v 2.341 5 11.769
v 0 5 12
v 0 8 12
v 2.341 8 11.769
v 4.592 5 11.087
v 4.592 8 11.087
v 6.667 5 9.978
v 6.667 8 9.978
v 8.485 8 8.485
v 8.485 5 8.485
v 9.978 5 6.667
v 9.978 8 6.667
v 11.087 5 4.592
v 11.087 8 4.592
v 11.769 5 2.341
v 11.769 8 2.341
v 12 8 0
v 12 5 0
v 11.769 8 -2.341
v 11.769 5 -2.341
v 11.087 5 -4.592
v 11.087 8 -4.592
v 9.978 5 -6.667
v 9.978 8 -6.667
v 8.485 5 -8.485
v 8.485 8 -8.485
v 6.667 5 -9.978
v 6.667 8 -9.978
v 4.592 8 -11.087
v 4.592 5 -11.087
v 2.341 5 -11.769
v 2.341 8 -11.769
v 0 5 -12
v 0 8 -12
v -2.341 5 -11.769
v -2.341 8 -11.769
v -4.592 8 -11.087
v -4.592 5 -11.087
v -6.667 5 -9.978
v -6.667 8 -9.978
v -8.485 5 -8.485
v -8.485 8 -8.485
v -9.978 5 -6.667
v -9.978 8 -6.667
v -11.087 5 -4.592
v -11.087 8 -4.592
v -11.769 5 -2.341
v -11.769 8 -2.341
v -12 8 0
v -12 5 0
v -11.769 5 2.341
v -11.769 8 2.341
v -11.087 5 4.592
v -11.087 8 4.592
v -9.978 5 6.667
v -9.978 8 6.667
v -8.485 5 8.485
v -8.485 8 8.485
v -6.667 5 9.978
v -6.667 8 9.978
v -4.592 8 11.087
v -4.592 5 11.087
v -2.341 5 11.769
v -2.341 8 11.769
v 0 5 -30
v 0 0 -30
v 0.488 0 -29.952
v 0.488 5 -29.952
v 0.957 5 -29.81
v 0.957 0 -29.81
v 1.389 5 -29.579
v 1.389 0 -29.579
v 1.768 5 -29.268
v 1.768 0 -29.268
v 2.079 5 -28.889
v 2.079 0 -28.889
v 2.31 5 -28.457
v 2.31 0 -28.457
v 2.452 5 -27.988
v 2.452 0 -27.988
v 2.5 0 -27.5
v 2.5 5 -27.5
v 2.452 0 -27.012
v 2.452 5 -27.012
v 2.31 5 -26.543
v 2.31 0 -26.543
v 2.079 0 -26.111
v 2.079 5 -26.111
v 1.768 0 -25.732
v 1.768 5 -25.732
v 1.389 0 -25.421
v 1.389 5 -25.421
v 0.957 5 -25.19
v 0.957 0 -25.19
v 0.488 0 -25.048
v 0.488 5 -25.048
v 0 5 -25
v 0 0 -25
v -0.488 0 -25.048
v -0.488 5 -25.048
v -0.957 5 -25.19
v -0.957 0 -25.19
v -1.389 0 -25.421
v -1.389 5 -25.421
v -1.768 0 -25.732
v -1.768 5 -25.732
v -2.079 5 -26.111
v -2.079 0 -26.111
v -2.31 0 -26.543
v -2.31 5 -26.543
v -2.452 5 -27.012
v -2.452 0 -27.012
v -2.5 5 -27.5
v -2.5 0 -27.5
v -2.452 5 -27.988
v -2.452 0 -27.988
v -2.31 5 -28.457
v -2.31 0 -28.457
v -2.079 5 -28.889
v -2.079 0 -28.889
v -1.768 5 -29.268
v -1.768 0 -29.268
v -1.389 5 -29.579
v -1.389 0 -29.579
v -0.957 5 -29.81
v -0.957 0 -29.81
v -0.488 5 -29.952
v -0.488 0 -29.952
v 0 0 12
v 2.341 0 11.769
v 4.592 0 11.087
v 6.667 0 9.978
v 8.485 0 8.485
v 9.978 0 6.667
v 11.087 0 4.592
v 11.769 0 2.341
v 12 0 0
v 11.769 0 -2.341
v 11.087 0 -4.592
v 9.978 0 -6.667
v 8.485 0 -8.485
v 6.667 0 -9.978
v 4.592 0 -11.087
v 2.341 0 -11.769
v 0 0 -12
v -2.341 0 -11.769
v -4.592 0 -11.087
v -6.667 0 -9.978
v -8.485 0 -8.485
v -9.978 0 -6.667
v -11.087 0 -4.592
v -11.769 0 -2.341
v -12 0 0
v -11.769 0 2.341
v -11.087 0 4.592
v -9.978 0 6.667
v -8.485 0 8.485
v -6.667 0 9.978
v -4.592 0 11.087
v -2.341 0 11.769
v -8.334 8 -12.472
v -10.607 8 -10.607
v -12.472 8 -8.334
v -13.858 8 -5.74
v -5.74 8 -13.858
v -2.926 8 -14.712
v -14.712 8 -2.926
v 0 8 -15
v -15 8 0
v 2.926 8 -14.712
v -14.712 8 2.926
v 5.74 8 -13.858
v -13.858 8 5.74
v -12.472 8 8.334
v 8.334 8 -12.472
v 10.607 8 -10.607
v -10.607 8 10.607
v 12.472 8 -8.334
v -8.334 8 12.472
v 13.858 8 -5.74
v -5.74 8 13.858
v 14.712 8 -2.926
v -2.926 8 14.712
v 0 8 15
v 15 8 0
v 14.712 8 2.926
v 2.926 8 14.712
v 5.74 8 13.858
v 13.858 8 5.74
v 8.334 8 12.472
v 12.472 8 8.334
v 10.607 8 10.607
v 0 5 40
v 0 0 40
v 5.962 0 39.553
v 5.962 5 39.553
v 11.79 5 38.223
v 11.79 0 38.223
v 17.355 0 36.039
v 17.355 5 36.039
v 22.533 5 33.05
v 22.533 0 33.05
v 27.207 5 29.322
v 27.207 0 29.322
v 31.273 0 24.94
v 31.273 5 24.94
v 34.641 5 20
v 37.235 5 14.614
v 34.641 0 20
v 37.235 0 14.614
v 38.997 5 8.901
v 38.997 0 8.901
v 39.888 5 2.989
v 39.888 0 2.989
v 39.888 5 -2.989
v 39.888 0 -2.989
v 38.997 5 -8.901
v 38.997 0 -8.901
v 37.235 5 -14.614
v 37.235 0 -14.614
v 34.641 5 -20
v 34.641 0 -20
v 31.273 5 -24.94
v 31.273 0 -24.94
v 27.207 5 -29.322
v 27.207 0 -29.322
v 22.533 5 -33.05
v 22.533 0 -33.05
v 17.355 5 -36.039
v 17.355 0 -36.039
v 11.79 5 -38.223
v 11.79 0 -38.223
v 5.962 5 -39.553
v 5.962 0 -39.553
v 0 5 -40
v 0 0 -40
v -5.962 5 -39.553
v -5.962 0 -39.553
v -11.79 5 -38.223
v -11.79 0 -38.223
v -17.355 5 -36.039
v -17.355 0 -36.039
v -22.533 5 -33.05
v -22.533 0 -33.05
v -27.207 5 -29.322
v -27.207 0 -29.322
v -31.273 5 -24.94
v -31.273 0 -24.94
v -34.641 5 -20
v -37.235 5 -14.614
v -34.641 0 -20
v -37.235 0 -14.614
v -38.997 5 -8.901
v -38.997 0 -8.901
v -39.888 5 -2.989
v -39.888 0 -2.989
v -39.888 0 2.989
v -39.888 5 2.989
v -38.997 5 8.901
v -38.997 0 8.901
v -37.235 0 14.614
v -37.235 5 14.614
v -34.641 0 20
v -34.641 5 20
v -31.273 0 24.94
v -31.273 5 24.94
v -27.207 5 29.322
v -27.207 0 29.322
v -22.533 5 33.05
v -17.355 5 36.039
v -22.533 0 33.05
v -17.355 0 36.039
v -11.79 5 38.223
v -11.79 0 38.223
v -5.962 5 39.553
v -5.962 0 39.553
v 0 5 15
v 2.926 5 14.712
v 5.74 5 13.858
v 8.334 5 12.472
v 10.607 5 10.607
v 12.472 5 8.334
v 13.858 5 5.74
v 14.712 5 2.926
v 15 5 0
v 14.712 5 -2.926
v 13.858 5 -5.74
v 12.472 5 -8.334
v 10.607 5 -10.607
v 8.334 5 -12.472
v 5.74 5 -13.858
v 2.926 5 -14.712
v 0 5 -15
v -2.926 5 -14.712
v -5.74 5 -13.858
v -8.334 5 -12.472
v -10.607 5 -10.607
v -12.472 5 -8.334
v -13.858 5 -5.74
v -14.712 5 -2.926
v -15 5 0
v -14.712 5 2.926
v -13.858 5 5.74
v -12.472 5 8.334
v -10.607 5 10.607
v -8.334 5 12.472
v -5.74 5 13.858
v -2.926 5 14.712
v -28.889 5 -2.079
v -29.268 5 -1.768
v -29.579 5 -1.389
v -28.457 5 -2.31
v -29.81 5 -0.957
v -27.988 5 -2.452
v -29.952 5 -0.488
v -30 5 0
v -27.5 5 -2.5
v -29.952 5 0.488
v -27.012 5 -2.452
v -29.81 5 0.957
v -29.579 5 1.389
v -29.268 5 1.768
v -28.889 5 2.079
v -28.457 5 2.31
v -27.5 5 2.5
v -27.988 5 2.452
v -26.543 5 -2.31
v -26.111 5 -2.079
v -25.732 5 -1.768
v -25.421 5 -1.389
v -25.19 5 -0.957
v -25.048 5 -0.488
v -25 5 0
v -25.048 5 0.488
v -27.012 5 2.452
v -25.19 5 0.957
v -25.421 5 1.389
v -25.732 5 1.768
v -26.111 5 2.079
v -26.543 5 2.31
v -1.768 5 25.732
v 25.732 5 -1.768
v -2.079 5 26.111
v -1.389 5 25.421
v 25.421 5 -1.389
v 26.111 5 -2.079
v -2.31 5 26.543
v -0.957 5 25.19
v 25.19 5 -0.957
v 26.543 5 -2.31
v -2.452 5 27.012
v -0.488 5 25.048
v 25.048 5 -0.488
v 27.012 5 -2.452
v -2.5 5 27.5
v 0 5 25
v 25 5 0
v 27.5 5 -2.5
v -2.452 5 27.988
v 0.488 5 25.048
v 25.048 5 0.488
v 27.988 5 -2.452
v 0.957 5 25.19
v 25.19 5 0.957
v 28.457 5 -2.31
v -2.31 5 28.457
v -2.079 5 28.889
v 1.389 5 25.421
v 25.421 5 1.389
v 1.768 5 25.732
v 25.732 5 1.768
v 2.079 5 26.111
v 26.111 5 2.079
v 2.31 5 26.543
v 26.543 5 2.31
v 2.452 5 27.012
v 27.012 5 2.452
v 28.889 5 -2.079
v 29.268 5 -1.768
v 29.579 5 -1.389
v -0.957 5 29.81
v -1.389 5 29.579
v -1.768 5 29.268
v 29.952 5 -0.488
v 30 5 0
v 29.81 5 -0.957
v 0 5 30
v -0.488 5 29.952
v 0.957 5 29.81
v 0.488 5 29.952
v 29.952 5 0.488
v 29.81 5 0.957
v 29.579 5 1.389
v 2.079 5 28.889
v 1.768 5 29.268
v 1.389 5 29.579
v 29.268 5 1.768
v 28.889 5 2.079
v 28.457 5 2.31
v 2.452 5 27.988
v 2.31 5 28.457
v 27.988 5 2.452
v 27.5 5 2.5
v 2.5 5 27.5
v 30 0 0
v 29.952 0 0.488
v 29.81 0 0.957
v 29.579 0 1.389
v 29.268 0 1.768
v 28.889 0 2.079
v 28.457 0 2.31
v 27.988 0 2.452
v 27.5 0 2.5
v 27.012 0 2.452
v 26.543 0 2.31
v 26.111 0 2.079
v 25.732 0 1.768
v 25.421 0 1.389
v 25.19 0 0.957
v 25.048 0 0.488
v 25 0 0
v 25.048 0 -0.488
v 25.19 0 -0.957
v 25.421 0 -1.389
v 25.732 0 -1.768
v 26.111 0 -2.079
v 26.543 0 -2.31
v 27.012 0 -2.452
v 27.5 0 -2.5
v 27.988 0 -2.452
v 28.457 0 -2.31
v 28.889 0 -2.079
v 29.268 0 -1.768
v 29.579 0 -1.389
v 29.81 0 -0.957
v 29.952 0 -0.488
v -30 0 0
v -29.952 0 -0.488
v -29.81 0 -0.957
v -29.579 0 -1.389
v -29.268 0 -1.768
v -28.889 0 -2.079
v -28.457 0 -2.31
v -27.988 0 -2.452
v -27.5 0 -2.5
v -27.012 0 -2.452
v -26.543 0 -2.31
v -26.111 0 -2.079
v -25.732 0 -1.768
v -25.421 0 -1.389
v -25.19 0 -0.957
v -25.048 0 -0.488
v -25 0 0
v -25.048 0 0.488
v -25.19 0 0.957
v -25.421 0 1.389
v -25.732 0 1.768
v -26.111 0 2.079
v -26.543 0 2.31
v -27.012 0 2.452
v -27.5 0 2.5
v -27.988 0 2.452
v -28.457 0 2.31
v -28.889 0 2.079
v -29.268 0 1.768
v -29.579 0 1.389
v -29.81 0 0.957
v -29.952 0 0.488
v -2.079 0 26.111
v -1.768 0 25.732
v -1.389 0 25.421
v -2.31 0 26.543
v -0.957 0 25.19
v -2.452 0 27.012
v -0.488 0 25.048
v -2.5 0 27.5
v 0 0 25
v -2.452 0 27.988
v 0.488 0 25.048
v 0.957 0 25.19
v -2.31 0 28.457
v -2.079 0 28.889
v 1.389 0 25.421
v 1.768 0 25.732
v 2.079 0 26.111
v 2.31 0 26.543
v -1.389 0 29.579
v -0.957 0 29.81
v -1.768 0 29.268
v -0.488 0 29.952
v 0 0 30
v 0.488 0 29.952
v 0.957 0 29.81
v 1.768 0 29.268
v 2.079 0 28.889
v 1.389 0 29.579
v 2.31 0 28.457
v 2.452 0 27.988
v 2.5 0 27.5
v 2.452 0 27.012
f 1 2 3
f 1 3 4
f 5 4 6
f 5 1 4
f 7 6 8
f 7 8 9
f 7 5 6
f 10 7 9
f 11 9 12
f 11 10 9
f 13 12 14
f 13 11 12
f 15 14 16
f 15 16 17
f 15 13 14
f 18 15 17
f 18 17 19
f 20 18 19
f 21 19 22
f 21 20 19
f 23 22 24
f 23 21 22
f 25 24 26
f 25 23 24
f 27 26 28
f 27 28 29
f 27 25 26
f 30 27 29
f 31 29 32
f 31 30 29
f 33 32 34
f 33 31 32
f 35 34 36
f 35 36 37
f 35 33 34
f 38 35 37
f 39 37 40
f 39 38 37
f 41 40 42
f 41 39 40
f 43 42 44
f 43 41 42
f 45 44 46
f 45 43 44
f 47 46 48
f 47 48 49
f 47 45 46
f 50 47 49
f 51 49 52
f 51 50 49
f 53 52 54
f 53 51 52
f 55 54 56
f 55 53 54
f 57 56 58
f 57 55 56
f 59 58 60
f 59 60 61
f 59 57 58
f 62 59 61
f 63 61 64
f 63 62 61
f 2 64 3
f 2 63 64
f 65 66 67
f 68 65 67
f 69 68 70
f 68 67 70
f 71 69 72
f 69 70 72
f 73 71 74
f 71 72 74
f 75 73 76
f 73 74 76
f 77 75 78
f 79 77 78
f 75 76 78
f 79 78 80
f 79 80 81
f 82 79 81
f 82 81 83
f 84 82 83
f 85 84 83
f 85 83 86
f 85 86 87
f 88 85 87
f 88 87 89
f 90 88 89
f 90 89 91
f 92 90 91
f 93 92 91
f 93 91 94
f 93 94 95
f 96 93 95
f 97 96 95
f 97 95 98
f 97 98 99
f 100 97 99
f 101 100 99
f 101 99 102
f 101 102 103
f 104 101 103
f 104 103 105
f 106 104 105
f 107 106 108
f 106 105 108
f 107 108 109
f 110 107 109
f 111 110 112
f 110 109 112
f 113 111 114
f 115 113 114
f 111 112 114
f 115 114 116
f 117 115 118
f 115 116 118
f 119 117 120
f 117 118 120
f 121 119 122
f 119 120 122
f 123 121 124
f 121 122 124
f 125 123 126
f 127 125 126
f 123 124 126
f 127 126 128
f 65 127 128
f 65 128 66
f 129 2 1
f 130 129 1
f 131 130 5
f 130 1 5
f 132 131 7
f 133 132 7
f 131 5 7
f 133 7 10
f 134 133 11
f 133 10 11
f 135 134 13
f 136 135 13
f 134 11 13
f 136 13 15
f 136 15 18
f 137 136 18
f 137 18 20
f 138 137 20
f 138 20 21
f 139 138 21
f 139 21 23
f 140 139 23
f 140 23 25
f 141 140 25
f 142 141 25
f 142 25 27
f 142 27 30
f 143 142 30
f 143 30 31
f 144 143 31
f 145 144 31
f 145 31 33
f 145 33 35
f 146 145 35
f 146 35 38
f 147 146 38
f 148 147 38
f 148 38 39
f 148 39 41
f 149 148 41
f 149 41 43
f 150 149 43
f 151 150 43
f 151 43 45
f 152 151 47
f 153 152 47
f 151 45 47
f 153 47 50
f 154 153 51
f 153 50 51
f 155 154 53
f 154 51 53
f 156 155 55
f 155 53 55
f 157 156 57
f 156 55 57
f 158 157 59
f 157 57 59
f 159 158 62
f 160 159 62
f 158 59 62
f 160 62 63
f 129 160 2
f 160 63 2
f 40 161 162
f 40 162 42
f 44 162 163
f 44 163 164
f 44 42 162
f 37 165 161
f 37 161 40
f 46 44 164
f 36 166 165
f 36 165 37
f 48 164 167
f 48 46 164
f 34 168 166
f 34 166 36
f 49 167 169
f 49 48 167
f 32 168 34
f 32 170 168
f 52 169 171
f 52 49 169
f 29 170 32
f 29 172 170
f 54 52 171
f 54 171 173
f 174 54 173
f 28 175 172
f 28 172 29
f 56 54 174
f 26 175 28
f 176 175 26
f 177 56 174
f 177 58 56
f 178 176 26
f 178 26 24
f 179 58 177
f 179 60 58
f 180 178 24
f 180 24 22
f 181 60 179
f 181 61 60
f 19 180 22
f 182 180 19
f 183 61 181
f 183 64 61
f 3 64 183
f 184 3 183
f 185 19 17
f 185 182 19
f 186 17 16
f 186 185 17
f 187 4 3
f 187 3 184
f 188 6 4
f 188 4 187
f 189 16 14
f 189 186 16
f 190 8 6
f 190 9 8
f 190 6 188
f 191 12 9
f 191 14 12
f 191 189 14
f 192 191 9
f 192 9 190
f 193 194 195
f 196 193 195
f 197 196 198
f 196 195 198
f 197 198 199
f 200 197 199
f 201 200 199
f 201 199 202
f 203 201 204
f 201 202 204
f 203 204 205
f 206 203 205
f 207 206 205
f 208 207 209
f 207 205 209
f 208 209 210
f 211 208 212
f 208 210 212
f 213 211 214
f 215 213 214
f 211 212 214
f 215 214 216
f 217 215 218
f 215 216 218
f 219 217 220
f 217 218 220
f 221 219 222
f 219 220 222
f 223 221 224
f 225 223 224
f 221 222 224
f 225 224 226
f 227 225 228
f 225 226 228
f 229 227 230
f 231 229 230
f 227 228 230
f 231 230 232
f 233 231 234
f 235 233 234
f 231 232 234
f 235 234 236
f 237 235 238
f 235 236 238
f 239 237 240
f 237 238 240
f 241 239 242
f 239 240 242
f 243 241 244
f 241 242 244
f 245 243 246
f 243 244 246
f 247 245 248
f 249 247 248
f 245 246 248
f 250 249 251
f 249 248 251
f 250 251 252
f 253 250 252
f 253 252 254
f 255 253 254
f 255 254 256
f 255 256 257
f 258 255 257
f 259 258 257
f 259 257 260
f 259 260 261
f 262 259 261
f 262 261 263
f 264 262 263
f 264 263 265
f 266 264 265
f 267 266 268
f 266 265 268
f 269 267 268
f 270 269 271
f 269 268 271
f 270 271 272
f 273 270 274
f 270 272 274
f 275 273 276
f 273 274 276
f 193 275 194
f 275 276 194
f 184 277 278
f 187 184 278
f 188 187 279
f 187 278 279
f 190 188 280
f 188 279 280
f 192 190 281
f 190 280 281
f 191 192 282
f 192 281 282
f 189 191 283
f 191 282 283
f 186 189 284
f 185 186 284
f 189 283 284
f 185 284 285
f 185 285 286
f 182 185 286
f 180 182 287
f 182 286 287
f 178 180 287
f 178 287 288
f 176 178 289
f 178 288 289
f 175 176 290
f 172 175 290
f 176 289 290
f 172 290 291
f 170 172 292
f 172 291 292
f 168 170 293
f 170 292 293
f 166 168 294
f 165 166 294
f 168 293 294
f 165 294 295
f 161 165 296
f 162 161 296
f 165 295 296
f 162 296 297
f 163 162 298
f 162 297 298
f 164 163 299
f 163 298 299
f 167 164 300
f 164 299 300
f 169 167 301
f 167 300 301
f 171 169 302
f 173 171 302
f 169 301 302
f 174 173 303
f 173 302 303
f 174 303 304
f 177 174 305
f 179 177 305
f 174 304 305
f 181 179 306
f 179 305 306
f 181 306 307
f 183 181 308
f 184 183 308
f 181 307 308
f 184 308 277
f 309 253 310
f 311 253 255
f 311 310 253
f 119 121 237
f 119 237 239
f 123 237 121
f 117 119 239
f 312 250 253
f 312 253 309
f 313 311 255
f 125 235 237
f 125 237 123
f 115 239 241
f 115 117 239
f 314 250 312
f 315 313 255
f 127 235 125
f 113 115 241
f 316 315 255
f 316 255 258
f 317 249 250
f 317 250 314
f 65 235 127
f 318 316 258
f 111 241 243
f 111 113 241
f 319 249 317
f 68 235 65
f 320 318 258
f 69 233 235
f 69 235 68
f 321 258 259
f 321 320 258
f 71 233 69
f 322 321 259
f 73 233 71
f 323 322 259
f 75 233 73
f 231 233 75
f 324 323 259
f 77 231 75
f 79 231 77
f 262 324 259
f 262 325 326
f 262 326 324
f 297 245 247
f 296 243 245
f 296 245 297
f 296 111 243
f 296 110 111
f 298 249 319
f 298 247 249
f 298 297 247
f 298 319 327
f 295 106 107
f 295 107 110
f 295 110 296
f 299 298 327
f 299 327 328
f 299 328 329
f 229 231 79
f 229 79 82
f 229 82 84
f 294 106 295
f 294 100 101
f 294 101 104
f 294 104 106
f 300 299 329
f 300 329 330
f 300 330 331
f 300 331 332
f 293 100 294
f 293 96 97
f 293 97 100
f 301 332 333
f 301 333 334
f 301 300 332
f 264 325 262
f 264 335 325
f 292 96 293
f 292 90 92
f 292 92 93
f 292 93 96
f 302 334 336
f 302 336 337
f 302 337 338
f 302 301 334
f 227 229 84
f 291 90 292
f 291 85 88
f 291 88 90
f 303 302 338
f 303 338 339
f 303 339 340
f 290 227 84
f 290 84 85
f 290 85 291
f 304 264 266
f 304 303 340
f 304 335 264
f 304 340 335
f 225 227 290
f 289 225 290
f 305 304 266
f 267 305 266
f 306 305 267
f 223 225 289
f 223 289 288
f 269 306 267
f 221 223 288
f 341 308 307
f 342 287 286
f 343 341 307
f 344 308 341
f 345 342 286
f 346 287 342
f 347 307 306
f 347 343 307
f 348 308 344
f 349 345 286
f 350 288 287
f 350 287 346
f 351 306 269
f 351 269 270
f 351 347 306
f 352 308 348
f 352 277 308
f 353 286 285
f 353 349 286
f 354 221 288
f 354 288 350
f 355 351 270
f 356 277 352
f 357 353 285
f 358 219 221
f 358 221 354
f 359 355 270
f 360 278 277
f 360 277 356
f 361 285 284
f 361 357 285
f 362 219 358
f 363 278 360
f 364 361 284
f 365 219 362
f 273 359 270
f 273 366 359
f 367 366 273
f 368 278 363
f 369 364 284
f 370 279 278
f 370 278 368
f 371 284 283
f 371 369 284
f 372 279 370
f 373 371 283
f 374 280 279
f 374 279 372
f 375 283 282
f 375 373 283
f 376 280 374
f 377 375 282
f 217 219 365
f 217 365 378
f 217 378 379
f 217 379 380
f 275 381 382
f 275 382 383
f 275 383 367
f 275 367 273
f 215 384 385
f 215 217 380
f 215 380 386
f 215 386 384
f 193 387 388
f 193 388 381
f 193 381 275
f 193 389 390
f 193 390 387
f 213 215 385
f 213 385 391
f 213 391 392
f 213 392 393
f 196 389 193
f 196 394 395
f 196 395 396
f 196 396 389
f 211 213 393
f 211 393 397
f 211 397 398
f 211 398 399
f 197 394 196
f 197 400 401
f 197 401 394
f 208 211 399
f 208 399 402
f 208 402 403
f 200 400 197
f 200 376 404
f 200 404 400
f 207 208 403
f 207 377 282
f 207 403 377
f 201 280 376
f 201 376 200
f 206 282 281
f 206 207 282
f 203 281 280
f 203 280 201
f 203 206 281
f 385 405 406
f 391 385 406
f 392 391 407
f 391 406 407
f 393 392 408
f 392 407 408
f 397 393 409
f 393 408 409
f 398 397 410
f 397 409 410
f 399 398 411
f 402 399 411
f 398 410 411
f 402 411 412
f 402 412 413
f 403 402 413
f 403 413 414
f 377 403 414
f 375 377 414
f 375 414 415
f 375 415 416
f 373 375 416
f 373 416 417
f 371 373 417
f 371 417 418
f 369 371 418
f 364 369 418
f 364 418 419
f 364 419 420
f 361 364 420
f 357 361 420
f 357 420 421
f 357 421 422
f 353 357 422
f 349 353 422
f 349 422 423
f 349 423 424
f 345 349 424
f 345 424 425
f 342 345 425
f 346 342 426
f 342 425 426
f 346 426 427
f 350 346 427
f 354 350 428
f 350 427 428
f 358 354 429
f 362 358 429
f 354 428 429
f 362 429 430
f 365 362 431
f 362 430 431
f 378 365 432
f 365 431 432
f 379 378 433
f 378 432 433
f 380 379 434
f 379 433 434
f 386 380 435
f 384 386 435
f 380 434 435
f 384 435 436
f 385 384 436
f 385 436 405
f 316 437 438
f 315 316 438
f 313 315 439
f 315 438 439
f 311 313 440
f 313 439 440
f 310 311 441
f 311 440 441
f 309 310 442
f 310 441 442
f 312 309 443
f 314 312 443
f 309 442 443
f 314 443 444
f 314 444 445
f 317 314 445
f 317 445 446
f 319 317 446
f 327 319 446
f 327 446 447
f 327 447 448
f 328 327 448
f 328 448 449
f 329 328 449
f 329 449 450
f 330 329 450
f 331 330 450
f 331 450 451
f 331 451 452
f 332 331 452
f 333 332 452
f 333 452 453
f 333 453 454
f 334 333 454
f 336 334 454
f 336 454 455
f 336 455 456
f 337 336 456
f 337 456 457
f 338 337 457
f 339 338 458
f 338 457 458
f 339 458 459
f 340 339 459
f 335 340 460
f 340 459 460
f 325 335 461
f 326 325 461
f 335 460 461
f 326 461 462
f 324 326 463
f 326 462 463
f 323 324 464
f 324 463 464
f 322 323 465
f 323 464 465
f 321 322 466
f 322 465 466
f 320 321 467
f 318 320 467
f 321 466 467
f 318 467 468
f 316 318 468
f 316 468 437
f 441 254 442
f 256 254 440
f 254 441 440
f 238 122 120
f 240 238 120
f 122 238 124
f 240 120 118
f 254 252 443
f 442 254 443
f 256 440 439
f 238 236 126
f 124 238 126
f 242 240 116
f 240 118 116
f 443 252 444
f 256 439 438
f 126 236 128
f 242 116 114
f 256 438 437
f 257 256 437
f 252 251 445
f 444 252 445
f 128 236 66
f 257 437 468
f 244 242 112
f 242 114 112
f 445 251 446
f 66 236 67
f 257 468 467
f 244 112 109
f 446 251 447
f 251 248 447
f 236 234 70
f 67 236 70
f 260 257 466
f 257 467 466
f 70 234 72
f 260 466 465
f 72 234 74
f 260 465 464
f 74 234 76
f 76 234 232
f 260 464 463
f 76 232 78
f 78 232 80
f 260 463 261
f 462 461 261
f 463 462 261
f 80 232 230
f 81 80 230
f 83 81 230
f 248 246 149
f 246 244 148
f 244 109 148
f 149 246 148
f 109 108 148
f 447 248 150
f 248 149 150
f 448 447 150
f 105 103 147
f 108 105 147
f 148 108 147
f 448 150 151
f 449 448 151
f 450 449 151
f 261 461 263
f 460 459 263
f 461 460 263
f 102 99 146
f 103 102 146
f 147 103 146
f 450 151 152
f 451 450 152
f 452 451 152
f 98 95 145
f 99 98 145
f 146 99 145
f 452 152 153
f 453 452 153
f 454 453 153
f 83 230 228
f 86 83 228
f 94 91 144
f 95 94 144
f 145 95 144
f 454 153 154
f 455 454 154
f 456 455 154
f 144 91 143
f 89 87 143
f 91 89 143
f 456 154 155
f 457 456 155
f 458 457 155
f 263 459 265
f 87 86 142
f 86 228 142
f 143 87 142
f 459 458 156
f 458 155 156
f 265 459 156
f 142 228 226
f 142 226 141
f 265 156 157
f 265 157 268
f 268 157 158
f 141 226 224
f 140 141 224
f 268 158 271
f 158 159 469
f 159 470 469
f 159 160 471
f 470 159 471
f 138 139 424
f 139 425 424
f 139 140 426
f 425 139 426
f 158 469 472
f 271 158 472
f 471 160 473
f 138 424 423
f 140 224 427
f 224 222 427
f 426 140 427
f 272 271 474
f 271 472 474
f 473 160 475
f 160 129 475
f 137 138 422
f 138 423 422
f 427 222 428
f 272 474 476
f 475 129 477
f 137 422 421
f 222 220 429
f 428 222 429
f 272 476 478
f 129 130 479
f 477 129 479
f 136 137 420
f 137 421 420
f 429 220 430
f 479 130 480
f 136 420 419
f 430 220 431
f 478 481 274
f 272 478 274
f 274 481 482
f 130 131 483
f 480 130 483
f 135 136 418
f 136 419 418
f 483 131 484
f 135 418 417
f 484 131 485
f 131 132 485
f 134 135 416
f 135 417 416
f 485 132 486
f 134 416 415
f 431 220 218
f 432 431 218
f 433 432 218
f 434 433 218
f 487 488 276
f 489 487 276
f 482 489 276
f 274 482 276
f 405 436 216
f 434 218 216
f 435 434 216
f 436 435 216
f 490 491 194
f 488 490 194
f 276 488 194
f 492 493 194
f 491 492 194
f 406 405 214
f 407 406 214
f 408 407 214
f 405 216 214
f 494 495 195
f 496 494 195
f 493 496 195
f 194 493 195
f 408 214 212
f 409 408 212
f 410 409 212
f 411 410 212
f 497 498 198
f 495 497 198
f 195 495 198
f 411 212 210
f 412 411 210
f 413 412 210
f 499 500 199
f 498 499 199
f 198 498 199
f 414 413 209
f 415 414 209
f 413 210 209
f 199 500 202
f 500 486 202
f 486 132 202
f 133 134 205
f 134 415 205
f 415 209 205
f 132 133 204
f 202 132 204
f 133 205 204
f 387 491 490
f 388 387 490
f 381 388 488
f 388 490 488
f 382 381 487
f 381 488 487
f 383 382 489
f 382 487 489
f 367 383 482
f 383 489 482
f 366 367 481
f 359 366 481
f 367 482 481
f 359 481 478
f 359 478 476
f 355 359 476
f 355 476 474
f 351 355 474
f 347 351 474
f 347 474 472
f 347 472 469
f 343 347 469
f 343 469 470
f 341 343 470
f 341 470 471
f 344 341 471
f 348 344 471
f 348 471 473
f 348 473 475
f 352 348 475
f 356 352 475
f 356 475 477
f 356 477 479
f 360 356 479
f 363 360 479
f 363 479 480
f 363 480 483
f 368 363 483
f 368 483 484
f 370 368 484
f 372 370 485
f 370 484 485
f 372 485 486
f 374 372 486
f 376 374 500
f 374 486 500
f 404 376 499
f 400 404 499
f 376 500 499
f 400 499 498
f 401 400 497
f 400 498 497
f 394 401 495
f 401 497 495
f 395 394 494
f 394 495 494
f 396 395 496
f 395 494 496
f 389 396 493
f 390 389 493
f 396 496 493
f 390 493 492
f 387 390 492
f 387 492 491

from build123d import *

# Parameters (mm, degrees)
SKETCH1_R             = 40
BOSS_EXTRUDE1_DEPTH   = 5
SKETCH2_R             = 15
SKETCH2_R_2           = 12
BOSS_EXTRUDE2_DEPTH   = 3
SKETCH3_R             = 12
CUT_EXTRUDE1_DEPTH    = 57.789083458
F_5_0MM_DOWEL_HOLE1_D = 5
CIRPATTERN1_COUNT     = 4


with BuildPart() as part:
    # Sketch1 → Boss-Extrude1 (new body)
    with BuildSketch(Plane(origin=(0, 0, 0), x_dir=(1, 0, 0), z_dir=(0, 1, 0))):
        with Locations(Location((0, 0, 0), (0, 0, 270))):
            Circle(SKETCH1_R)
    extrude(amount=BOSS_EXTRUDE1_DEPTH)

    # Sketch2 → Boss-Extrude2 (add)
    with BuildSketch(Plane(origin=(0, 5, 0), x_dir=(1, 0, 0), z_dir=(0, 1, 0))):
        with Locations(Location((0, 0, 0), (0, 0, 270))):
            Circle(SKETCH2_R)
        with Locations(Location((0, 0, 0), (0, 0, 270))):
            Circle(SKETCH2_R_2, mode=Mode.SUBTRACT)
    extrude(amount=BOSS_EXTRUDE2_DEPTH)

    # Sketch3 → Cut-Extrude1 (cut, through all)
    with BuildSketch(Plane(origin=(0, 5, 0), x_dir=(1, 0, 0), z_dir=(0, 1, 0))):
        with Locations(Location((0, 0, 0), (0, 0, 270))):
            Circle(SKETCH3_R)
    extrude(amount=-CUT_EXTRUDE1_DEPTH, mode=Mode.SUBTRACT)

    # Ø5.0mm Dowel Hole1 (through all)
    with Locations(Plane(origin=(0, 5, -27.5), x_dir=(0, 0, 1), z_dir=(0, 1, 0))):
        with Locations((0, 0)):
            f_5_0mm_dowel_hole1 = Hole(F_5_0MM_DOWEL_HOLE1_D / 2)

    # CirPattern1: Ø5.0mm Dowel Hole1 ×4 about axis
    cirpattern1_axis = Axis((0, 0, 0), (0, 1, 0))
    for i in range(1, CIRPATTERN1_COUNT):
        add(f_5_0mm_dowel_hole1.rotate(cirpattern1_axis, i * 360 / CIRPATTERN1_COUNT), mode=Mode.SUBTRACT)


solid = part.part
